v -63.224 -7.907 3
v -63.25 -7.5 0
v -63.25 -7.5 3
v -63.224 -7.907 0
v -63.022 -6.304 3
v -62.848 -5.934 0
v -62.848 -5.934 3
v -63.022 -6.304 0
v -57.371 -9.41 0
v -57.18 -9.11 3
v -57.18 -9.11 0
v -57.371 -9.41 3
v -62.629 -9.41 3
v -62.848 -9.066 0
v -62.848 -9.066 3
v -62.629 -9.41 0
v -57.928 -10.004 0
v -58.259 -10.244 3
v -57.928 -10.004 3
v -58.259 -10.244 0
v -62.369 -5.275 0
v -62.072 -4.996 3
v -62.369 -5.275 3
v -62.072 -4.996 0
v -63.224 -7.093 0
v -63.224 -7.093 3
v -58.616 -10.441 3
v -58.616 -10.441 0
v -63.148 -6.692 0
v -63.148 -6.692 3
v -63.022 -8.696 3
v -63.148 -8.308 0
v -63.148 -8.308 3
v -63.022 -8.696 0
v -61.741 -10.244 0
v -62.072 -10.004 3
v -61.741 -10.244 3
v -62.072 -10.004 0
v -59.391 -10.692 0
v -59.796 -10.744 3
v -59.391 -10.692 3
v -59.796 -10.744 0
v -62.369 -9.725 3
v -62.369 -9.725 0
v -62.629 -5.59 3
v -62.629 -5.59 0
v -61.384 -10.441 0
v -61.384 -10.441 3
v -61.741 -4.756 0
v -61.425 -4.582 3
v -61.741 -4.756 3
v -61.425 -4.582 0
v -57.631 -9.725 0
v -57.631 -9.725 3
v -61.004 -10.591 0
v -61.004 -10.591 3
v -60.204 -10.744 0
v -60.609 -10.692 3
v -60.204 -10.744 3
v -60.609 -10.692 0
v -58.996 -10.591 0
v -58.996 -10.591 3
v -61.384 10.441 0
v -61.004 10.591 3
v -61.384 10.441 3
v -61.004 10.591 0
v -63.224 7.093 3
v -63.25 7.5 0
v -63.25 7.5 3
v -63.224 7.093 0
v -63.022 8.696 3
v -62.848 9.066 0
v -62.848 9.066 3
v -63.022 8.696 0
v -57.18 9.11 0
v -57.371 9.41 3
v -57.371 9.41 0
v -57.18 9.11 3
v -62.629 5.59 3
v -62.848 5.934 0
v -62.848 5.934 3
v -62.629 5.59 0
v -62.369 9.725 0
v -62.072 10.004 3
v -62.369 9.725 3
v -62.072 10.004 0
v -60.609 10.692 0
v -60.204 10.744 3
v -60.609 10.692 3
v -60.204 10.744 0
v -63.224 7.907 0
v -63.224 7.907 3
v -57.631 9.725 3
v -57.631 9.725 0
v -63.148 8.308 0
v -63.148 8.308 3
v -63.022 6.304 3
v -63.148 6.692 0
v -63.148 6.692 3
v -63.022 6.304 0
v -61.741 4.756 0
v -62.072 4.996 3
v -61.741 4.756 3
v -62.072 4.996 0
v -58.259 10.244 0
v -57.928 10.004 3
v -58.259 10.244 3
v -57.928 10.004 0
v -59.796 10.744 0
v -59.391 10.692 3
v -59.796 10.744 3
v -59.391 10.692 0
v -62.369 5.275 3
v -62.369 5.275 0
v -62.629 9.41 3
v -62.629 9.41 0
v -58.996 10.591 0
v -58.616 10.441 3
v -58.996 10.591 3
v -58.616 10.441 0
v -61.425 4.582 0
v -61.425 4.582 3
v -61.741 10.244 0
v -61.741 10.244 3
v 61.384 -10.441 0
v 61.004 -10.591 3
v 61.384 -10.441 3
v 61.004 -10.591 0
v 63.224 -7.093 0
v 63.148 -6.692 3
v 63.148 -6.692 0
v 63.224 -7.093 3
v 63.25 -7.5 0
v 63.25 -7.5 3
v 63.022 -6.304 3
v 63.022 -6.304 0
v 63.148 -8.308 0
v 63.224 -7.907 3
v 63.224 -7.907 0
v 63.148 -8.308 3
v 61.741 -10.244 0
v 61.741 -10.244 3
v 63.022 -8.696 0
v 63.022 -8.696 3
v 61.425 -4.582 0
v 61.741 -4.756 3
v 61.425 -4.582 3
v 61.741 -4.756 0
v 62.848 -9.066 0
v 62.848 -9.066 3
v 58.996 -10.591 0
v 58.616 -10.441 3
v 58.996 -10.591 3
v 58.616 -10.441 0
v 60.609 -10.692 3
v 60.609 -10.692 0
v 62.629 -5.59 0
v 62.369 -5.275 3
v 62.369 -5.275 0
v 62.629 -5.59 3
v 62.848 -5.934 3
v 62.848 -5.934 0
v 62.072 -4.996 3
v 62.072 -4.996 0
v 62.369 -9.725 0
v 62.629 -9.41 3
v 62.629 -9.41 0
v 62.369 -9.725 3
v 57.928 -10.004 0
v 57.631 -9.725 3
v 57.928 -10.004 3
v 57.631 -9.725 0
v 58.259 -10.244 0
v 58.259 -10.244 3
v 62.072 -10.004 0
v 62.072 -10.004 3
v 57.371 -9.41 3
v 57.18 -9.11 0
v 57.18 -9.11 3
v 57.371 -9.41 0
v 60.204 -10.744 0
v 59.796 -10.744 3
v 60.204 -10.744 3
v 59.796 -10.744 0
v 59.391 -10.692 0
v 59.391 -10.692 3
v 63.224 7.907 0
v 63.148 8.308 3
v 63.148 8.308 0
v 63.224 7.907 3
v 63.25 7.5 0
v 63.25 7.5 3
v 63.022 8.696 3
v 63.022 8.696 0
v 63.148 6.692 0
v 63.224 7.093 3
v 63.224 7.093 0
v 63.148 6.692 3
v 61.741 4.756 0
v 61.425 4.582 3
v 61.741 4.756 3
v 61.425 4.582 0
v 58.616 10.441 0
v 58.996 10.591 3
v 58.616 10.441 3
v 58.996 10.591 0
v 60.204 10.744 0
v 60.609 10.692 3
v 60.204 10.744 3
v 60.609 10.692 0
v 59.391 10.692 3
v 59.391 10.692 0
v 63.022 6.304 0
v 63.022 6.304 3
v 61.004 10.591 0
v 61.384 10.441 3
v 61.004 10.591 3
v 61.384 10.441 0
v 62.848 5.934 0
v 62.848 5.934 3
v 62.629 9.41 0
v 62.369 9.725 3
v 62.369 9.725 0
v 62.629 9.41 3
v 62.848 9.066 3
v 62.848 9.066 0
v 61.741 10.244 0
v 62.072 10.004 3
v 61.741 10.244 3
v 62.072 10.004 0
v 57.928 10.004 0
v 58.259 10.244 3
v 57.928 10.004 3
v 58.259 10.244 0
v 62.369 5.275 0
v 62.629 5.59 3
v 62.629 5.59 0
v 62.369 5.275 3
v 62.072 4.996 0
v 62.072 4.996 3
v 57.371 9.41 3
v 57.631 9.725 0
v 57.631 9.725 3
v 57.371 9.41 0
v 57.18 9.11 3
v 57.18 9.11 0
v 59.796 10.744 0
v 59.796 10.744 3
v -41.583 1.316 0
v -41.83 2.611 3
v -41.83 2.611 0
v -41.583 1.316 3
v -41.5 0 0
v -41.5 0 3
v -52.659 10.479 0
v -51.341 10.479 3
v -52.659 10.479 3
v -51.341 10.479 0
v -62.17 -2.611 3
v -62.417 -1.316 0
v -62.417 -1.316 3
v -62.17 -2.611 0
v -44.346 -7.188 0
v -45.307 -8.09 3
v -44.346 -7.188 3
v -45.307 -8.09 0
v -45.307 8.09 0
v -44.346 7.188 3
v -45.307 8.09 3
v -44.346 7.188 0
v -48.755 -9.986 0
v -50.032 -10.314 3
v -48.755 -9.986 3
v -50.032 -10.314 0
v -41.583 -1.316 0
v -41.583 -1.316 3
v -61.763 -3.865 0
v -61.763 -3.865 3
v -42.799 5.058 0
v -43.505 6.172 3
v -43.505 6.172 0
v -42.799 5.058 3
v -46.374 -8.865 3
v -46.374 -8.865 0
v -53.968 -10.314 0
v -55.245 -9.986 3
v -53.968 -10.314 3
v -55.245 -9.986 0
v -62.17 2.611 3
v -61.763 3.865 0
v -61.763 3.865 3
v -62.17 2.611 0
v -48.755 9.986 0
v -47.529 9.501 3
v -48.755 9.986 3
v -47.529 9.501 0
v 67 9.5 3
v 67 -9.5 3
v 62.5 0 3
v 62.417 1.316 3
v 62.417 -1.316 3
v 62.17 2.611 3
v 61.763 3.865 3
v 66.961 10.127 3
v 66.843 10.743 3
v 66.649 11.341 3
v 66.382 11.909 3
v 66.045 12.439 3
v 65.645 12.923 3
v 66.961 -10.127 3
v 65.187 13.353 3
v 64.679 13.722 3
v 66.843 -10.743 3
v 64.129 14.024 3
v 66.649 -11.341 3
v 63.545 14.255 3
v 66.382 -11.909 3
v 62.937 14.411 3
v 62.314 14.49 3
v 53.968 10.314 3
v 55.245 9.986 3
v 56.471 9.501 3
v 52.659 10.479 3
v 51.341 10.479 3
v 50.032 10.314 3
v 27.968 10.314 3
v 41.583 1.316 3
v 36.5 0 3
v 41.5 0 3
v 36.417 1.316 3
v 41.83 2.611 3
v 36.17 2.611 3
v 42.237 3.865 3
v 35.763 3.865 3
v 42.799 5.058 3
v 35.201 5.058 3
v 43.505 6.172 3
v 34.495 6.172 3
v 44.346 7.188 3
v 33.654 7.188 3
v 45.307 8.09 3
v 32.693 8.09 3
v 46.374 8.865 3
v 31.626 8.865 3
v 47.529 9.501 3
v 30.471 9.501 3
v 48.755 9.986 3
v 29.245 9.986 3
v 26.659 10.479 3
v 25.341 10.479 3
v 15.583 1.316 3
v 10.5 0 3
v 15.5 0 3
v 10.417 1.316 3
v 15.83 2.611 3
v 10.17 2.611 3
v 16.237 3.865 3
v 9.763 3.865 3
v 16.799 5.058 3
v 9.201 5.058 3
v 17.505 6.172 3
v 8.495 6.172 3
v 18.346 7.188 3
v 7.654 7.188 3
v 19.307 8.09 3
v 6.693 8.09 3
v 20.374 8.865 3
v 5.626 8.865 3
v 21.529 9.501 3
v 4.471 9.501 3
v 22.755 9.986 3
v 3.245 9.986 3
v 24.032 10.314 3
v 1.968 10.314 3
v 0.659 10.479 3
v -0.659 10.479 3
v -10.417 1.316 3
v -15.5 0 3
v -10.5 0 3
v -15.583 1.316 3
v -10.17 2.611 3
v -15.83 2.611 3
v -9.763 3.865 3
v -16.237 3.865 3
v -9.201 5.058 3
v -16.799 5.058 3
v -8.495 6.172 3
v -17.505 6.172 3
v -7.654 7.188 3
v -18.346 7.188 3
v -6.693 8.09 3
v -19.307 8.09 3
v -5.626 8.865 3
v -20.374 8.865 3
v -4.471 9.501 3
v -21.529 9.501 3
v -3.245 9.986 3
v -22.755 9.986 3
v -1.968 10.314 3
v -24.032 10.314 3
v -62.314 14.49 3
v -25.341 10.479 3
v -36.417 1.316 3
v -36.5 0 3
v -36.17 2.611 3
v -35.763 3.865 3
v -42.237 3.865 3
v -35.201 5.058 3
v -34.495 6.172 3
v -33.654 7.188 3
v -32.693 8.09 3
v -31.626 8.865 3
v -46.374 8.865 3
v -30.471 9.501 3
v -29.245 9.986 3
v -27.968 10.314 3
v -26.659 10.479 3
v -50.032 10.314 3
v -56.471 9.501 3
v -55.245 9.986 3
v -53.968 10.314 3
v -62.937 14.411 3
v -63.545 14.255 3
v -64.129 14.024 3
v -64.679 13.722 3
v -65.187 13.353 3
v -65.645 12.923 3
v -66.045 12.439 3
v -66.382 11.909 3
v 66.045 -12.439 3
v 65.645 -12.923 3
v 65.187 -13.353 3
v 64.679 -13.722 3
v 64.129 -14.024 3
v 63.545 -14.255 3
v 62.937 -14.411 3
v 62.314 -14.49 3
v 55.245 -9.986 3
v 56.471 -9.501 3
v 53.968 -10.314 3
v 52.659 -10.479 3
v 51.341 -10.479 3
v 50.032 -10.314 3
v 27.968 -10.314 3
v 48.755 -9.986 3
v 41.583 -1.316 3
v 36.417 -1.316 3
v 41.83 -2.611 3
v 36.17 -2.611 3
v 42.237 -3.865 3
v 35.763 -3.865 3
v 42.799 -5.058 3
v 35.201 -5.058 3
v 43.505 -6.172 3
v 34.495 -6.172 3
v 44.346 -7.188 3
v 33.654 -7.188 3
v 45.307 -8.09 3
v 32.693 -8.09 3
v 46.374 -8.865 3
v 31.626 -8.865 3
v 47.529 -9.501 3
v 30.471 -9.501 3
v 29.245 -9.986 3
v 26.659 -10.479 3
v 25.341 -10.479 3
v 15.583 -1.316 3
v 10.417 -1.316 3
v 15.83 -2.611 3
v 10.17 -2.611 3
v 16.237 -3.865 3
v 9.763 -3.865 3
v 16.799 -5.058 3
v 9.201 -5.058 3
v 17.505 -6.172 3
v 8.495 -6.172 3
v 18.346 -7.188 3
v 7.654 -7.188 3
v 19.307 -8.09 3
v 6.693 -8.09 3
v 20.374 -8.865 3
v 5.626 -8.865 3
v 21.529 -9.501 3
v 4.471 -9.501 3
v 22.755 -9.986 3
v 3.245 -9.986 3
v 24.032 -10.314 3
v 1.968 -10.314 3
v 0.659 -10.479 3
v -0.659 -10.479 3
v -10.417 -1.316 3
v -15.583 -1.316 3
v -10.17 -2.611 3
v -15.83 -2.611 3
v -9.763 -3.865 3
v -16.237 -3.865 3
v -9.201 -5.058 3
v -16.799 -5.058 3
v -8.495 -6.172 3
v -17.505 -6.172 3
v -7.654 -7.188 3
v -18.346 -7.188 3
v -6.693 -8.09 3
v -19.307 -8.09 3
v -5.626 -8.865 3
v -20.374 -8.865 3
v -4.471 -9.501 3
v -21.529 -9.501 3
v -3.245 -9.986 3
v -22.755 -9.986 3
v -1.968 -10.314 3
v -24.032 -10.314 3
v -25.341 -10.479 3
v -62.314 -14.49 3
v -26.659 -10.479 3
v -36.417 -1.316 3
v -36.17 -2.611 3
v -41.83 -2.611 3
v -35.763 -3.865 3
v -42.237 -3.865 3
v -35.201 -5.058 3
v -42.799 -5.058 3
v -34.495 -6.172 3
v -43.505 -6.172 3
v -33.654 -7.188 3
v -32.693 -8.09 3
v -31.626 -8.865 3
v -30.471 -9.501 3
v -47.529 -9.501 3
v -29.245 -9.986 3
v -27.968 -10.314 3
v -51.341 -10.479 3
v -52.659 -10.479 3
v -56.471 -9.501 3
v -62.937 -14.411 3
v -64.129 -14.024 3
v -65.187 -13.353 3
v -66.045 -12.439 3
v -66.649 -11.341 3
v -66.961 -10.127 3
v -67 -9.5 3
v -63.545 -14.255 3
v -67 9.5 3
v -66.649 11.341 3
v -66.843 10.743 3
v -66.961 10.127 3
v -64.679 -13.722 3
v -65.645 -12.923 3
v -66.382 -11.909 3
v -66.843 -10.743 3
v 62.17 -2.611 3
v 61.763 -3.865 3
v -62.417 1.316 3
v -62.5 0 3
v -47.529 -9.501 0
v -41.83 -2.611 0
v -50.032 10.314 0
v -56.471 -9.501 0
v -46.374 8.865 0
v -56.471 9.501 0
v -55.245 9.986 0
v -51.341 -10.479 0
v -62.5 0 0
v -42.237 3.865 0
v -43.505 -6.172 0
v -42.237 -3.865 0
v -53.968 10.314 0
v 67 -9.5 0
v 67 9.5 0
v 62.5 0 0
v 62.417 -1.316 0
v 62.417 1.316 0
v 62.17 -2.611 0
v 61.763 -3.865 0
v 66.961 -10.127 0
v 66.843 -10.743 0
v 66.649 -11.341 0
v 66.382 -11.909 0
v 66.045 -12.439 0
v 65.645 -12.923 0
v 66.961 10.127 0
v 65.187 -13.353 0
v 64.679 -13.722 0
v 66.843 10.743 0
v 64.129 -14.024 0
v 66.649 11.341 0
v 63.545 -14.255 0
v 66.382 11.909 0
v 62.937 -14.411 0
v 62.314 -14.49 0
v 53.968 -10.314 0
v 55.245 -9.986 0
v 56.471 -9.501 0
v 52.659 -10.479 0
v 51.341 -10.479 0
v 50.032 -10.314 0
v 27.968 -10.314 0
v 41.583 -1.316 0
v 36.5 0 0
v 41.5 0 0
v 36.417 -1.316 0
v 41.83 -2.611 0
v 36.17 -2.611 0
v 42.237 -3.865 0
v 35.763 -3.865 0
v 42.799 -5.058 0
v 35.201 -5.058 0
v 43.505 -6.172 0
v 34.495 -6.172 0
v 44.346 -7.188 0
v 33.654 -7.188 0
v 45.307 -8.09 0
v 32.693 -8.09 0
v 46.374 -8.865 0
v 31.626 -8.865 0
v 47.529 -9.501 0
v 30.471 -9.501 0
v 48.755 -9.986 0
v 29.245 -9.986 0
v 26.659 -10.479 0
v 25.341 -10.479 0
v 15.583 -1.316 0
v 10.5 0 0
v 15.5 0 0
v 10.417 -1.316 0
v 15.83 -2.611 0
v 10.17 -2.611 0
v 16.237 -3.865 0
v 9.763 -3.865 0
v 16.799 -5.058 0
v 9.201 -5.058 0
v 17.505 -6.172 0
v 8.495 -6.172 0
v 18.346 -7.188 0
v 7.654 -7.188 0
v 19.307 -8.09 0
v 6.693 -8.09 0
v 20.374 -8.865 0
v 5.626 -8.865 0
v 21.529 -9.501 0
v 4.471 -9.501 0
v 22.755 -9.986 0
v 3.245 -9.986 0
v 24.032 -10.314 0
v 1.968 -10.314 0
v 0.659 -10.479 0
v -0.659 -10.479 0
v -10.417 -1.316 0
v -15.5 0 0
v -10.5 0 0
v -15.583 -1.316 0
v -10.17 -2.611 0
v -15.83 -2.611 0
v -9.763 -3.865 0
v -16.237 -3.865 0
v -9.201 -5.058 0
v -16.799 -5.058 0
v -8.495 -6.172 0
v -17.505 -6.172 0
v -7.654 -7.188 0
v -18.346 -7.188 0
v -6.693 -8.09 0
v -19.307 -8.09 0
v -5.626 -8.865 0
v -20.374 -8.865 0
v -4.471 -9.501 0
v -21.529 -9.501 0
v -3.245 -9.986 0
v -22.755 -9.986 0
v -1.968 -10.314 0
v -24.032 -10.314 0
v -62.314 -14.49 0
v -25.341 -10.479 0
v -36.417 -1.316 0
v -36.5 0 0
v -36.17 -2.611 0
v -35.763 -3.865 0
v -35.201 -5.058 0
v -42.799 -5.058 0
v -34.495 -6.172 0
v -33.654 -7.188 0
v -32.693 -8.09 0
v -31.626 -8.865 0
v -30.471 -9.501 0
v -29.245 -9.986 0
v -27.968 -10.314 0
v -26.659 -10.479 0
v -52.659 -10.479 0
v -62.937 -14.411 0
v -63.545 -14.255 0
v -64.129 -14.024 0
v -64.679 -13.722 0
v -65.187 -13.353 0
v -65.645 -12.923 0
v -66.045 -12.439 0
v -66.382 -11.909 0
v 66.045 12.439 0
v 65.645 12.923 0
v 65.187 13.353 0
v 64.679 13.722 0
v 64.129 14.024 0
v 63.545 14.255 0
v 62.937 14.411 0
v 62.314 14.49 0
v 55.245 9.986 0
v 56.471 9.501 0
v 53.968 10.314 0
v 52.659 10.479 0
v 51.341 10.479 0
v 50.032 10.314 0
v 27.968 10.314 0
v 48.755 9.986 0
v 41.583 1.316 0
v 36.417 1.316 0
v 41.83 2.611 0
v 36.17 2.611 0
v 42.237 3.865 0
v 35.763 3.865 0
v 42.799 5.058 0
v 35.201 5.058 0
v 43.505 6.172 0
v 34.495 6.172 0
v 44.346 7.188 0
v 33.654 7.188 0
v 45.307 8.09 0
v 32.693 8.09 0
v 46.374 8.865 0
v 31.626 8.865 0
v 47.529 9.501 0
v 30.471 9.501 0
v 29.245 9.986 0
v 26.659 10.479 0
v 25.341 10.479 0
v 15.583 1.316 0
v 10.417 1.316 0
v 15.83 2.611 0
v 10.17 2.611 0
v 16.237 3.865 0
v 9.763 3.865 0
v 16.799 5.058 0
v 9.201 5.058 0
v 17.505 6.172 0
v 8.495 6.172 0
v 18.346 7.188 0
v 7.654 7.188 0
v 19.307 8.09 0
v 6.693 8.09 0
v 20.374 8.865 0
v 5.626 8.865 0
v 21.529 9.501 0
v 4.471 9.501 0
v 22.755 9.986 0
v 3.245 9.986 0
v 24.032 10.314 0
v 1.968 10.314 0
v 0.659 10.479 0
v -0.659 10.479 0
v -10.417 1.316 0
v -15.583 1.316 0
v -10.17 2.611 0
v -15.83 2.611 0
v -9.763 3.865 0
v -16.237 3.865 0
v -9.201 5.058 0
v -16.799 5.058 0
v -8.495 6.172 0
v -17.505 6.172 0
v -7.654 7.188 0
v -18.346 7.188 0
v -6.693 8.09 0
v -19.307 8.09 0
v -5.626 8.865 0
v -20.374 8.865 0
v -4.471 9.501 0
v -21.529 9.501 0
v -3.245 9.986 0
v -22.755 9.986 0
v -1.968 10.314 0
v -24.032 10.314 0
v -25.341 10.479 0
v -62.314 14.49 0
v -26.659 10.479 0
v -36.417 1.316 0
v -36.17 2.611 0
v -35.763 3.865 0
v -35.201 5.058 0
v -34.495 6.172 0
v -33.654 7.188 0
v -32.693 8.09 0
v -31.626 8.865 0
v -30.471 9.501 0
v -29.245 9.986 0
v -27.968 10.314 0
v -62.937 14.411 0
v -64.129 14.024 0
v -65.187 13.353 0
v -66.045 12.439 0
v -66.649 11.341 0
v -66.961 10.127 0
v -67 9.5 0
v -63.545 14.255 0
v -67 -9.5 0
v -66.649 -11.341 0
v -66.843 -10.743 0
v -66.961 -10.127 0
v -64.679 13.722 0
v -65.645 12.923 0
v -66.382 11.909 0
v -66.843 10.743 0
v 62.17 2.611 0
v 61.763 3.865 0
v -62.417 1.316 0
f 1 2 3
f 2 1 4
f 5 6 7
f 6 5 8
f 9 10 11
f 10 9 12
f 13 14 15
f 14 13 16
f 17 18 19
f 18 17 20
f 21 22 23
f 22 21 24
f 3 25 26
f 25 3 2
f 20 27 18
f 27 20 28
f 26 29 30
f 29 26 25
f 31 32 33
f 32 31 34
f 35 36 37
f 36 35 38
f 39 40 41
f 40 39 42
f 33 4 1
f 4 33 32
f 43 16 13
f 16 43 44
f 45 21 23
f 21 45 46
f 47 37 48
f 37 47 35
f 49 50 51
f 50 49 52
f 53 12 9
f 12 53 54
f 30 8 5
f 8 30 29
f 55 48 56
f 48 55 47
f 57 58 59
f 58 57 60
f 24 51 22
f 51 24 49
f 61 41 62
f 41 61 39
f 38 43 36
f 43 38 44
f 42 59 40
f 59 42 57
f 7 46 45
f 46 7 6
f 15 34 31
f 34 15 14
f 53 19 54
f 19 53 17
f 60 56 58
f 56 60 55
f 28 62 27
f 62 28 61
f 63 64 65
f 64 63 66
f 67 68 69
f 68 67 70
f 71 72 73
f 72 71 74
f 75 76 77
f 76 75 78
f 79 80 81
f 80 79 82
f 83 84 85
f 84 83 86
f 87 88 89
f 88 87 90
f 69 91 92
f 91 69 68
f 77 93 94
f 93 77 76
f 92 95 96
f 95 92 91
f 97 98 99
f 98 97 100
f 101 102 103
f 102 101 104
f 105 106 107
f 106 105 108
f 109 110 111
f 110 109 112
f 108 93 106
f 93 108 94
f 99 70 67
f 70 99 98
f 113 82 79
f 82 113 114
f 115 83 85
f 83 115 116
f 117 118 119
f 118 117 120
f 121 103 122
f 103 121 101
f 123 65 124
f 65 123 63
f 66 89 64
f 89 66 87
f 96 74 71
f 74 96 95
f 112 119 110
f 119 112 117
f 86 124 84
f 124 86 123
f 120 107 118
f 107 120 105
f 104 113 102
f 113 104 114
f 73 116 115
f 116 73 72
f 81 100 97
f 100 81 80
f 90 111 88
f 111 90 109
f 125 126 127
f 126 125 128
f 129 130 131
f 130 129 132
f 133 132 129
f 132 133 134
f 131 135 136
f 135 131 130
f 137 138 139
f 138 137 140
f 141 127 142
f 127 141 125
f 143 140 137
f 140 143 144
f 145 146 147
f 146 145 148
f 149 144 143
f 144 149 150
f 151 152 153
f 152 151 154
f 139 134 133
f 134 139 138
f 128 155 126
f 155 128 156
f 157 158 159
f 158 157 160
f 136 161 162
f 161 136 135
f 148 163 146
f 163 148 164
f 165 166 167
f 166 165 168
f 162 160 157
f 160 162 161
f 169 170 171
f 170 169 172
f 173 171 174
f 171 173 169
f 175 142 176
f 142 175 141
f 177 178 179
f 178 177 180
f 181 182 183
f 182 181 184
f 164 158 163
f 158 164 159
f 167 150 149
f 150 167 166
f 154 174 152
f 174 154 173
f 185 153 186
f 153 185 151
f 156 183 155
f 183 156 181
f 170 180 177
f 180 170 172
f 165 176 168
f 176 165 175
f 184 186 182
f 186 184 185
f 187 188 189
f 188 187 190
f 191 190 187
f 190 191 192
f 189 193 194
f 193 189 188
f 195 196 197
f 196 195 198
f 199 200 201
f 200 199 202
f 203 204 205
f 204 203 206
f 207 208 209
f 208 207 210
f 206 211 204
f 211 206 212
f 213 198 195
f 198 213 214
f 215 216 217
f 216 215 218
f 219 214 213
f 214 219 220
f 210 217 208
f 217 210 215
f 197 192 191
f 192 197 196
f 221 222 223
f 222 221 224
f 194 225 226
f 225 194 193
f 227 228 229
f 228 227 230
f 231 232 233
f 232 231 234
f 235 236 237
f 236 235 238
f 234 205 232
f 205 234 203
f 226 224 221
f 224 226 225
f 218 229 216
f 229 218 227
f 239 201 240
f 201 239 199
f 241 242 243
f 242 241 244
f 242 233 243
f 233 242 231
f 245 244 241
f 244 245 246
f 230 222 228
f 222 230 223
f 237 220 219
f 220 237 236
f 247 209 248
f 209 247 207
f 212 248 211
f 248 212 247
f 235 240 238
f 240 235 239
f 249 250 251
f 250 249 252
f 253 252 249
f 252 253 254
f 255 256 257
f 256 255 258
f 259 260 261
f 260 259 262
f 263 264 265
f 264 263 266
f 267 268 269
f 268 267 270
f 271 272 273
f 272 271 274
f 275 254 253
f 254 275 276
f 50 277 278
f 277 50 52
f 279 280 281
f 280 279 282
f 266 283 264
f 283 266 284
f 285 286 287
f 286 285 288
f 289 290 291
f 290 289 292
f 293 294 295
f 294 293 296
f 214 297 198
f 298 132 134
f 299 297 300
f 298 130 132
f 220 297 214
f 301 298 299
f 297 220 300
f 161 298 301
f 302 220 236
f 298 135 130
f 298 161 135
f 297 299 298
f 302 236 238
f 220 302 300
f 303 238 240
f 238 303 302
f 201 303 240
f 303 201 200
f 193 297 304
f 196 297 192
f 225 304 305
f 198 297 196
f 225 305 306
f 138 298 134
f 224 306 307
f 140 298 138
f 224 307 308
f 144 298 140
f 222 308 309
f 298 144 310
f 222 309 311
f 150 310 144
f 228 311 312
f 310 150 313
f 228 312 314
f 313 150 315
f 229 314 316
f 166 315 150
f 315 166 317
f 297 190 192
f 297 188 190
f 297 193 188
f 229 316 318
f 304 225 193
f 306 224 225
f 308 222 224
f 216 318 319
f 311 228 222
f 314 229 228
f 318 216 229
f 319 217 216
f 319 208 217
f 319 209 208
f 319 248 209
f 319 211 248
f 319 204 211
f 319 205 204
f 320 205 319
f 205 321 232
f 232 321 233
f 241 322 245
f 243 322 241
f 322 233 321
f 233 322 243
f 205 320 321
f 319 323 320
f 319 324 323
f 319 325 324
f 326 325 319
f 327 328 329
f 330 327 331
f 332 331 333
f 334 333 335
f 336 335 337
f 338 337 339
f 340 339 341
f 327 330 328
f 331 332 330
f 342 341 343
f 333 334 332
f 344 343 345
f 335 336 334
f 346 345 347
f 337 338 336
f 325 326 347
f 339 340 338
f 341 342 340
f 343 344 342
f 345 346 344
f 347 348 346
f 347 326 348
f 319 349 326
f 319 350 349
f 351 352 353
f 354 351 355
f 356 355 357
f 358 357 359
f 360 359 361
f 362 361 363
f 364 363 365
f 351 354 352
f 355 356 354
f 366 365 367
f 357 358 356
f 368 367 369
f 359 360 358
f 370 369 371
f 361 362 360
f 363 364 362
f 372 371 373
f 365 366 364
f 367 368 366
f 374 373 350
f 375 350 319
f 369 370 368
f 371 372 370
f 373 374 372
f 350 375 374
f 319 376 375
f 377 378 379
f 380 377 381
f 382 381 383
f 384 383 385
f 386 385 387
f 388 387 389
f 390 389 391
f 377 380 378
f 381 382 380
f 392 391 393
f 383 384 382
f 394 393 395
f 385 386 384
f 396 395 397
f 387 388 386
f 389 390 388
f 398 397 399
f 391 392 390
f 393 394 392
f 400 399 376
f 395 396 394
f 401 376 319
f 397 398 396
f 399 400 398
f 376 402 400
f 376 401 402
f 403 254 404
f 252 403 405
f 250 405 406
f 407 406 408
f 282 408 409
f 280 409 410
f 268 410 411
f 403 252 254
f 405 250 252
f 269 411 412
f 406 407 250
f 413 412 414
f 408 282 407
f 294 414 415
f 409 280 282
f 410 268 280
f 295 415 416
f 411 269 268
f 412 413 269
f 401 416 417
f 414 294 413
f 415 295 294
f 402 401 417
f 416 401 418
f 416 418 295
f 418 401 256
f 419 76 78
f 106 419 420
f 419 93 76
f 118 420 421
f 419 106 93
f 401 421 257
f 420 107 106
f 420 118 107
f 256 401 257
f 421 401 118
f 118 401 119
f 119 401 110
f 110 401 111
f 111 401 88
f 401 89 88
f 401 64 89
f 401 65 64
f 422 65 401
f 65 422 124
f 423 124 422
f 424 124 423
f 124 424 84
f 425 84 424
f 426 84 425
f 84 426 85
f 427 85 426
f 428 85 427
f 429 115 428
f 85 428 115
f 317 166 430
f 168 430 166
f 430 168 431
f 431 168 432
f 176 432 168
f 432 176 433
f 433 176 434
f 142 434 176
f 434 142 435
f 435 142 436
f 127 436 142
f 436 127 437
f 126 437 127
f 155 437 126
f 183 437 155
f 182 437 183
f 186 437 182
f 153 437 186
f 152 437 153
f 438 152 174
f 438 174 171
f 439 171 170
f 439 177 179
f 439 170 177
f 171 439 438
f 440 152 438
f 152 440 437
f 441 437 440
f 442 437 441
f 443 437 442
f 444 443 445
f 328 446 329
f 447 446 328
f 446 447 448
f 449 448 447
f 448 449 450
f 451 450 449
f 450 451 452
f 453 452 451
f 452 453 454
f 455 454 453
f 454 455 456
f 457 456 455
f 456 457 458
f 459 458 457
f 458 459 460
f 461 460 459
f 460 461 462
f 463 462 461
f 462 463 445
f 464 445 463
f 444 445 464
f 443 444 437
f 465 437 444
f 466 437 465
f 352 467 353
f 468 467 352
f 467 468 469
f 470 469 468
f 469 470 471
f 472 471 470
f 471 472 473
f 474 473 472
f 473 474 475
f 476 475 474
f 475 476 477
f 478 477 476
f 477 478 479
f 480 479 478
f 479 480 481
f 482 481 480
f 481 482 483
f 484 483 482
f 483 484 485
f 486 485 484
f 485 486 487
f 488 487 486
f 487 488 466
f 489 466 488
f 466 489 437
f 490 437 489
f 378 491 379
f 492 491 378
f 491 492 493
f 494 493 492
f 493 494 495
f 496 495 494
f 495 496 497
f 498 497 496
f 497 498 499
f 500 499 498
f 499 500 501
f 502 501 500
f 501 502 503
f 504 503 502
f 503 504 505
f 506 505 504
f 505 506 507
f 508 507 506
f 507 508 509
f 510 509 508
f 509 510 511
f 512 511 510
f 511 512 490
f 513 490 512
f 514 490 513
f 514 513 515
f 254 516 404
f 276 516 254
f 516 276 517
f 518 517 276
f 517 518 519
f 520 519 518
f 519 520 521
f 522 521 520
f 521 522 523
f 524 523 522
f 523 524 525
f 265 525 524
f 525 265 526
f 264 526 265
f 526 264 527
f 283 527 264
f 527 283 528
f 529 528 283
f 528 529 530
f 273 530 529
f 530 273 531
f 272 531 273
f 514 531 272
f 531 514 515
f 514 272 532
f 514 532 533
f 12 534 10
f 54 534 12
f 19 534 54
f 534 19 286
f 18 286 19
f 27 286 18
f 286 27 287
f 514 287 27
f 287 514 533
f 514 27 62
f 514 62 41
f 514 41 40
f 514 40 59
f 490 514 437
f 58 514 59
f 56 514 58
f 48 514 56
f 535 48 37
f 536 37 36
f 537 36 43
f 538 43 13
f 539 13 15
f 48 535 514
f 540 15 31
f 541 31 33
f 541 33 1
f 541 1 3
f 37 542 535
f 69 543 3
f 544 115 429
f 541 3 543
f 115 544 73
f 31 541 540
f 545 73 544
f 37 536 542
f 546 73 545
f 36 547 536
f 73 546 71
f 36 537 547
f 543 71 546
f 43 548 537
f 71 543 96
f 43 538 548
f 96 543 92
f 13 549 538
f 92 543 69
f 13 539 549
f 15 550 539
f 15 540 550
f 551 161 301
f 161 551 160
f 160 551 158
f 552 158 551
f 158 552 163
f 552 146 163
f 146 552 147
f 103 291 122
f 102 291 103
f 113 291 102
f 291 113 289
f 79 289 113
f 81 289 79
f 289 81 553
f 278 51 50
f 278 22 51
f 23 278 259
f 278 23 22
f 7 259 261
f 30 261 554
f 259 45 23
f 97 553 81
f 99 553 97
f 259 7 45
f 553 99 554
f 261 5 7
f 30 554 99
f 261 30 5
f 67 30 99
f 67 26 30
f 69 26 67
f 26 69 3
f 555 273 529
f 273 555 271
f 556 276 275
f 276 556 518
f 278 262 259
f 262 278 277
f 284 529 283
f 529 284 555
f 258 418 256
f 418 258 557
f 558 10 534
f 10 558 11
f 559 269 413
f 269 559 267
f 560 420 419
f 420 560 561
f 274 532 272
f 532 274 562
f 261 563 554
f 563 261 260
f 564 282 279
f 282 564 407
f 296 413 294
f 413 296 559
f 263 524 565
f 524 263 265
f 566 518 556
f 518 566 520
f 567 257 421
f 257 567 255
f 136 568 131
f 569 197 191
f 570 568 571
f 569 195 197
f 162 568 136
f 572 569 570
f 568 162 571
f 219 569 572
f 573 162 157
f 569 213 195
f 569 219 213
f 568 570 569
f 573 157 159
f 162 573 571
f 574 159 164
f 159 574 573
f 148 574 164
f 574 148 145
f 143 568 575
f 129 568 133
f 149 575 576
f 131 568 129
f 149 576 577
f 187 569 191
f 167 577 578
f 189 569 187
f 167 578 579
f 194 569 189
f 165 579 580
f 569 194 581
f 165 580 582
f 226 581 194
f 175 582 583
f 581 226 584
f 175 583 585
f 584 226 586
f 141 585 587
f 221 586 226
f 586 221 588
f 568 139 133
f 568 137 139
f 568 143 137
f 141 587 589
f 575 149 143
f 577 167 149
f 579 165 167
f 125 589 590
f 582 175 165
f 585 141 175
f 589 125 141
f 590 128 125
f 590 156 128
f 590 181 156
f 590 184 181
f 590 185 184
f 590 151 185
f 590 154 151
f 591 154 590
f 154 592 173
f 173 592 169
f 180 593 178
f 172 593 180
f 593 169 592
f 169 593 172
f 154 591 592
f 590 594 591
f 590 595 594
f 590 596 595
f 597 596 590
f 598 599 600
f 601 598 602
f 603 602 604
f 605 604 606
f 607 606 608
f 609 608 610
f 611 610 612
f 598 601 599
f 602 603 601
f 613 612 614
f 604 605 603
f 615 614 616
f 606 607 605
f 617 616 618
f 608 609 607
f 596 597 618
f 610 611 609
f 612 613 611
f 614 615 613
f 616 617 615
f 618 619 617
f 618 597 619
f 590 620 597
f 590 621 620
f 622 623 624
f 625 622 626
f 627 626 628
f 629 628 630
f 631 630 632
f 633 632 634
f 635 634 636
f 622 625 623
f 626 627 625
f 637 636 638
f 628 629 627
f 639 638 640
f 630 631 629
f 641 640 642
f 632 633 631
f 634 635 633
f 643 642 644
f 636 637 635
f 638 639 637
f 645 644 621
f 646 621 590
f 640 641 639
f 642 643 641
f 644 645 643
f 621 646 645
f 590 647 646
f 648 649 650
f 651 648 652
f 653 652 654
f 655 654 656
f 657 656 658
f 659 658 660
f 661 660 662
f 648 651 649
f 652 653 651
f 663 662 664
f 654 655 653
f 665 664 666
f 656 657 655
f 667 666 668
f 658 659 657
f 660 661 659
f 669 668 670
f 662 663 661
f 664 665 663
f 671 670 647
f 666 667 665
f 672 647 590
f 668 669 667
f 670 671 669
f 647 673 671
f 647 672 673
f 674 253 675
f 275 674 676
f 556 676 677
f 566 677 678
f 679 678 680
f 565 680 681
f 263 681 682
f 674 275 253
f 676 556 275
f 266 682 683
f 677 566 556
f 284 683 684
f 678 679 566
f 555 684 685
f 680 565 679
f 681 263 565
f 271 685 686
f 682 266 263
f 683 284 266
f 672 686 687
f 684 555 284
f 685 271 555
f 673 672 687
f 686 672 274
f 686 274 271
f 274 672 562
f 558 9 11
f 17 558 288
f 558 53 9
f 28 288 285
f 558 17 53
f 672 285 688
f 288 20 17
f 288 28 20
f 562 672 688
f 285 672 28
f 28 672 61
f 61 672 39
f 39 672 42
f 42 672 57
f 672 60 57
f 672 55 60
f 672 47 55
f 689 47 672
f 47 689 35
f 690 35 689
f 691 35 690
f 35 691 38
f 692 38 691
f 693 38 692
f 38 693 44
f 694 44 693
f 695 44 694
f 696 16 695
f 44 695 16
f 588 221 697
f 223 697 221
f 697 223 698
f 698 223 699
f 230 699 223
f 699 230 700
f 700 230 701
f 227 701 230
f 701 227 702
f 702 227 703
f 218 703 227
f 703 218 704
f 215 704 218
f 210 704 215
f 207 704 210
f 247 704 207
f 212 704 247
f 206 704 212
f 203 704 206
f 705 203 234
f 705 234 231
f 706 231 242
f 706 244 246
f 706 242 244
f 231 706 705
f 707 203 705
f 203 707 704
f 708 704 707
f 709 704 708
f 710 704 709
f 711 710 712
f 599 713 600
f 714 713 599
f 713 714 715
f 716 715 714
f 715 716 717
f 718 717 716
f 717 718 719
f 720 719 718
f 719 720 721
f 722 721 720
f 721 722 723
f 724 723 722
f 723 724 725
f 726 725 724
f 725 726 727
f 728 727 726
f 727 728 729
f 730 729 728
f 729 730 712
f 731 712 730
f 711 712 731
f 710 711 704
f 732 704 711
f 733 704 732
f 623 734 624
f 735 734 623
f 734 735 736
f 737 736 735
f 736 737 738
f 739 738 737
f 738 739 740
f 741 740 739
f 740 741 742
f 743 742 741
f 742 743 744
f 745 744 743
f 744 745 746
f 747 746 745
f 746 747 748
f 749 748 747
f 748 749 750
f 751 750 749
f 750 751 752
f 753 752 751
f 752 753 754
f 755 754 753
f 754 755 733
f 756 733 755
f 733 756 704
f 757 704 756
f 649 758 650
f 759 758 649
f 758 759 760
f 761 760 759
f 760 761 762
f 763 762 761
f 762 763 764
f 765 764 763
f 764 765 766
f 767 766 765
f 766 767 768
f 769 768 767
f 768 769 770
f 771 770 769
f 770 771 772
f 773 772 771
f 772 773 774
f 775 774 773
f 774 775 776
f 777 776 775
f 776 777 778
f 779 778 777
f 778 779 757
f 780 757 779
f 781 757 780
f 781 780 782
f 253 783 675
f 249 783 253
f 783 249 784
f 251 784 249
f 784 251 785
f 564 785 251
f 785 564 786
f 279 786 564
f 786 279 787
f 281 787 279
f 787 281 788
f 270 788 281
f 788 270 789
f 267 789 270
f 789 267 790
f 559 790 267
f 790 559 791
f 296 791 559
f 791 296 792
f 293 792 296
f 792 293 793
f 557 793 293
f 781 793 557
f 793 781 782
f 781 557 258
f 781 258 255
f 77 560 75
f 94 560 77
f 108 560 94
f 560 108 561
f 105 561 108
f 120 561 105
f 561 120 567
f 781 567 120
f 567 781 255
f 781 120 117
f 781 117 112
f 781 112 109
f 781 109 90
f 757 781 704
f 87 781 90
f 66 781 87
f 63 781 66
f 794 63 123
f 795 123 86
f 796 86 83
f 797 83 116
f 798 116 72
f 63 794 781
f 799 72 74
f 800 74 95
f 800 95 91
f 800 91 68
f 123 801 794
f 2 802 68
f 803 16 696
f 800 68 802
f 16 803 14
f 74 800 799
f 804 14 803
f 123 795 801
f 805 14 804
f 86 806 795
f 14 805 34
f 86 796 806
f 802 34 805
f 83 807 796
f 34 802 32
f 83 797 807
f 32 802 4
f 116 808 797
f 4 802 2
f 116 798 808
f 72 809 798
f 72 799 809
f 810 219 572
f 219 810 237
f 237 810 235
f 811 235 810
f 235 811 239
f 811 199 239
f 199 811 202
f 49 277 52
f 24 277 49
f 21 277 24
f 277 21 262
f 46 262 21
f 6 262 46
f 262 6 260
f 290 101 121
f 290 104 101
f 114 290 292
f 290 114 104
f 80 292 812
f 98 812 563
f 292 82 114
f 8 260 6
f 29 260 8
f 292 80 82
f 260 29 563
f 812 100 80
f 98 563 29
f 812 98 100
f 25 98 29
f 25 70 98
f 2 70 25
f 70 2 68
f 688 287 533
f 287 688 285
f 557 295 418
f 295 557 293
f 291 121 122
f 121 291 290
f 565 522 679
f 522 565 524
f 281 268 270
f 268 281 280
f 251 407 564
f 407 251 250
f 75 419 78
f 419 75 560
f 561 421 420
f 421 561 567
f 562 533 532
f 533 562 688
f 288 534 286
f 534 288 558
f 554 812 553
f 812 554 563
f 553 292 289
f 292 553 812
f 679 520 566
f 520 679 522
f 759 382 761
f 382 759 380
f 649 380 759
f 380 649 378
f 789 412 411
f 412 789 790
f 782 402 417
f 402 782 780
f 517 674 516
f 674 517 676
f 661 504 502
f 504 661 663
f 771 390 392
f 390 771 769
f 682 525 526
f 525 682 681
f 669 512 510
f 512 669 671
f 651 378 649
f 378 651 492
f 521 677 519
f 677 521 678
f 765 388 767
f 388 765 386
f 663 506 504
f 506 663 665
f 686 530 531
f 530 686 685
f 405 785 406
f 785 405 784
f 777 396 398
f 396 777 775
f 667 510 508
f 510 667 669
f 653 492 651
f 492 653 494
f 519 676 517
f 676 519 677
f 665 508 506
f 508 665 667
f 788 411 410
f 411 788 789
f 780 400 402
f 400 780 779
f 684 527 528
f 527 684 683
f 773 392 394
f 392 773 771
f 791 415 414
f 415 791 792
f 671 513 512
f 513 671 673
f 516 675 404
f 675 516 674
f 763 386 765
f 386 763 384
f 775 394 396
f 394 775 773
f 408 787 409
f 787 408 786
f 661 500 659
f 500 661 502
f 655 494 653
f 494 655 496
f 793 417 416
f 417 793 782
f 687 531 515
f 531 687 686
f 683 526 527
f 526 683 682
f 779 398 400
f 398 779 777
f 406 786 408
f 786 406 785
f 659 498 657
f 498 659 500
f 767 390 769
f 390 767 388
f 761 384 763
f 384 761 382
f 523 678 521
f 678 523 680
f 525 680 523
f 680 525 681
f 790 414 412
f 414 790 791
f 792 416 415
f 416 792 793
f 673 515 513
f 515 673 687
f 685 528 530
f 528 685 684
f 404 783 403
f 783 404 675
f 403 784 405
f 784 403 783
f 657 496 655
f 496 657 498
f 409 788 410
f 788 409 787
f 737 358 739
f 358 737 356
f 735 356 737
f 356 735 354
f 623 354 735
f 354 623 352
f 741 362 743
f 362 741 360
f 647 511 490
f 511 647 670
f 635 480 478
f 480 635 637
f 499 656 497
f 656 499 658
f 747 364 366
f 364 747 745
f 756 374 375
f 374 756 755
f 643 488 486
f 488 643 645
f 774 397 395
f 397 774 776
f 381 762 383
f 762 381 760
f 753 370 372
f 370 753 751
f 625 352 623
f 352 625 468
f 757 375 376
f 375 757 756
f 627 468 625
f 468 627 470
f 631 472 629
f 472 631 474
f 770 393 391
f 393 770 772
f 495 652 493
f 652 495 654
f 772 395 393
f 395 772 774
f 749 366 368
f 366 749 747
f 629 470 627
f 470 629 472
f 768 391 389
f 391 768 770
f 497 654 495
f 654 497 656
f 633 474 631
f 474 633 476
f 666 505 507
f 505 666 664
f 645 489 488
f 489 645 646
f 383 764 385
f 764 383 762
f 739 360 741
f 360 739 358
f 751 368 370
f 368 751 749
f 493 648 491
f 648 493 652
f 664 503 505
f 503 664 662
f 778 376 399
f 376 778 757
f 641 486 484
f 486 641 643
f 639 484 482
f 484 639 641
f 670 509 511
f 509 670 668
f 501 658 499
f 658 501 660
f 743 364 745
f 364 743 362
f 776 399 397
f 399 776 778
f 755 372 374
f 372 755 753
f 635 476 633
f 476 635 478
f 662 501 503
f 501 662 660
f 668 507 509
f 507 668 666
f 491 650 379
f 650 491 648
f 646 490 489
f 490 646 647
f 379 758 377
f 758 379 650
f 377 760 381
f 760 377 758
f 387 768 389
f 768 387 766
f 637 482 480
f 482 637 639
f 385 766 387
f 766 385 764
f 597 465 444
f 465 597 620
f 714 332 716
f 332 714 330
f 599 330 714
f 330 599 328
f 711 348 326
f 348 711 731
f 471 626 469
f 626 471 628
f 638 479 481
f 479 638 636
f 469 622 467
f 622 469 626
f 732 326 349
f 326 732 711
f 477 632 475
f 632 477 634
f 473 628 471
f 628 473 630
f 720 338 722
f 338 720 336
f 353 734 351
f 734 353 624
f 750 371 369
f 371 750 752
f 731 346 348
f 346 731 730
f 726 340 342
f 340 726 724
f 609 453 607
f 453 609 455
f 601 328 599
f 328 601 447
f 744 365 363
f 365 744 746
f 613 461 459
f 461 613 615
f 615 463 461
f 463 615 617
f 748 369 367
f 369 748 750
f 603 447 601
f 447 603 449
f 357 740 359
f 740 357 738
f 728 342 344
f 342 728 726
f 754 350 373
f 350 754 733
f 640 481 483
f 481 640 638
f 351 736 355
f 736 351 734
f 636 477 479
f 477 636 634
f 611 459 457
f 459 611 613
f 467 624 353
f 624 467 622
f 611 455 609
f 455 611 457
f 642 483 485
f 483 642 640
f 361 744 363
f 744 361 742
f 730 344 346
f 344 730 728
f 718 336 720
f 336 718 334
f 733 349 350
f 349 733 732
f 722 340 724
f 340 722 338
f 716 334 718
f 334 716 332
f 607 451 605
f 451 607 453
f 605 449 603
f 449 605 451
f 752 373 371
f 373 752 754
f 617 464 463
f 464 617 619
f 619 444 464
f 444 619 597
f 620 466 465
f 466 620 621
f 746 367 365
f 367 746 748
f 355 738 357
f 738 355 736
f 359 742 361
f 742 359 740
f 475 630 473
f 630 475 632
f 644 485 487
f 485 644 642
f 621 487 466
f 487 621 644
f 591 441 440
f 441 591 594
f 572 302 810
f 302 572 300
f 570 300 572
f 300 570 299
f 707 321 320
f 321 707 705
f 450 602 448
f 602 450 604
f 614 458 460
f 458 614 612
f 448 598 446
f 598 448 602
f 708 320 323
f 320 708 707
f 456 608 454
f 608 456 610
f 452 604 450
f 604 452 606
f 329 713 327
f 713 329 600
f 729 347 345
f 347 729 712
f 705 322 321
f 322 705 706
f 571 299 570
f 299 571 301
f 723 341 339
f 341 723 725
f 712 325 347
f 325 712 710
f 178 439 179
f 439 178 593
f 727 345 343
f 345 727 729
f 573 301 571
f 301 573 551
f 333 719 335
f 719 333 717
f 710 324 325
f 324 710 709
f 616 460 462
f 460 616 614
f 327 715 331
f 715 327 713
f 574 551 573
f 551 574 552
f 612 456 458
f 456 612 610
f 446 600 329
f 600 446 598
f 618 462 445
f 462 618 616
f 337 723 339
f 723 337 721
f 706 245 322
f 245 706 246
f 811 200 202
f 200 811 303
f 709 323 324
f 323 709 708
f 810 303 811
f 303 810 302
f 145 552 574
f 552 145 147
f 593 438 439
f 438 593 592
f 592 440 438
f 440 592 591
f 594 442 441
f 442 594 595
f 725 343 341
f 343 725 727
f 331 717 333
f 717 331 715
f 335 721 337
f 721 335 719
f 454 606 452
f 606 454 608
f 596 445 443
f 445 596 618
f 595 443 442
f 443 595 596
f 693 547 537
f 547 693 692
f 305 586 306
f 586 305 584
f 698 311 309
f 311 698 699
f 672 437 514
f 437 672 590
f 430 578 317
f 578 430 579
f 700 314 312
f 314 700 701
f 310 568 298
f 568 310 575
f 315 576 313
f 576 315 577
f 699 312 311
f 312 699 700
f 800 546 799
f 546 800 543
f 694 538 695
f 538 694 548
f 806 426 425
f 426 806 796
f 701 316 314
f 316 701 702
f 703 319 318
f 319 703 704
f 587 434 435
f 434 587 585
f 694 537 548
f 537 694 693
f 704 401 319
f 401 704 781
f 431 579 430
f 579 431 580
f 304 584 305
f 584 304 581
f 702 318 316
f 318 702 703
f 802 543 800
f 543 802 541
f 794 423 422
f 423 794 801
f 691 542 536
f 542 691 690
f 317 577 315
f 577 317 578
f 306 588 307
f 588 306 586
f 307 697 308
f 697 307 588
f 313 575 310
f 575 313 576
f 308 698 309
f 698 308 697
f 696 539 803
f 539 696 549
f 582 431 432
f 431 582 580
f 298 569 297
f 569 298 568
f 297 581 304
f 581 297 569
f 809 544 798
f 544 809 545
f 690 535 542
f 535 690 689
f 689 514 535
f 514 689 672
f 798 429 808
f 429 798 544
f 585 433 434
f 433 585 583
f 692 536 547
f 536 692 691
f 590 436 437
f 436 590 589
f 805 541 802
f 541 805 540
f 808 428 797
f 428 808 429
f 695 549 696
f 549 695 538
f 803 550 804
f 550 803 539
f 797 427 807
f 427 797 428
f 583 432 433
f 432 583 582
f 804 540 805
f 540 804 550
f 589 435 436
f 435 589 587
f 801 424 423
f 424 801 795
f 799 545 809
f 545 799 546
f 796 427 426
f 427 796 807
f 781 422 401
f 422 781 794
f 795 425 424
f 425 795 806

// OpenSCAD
$fn = 50;

difference() {
	union() {
		hull() {
			translate(v = [-62.0, 9.5, 0]) {
				cylinder(h = 3, r = 5);
			}
			translate(v = [62.0, 9.5, 0]) {
				cylinder(h = 3, r = 5);
			}
			translate(v = [-62.0, -9.5, 0]) {
				cylinder(h = 3, r = 5);
			}
			translate(v = [62.0, -9.5, 0]) {
				cylinder(h = 3, r = 5);
			}
		}
	}
	union() {
		translate(v = [-60.0, -7.5, -100.0]) {
			cylinder(h = 200, r = 3.25);
		}
		translate(v = [-60.0, 7.5, -100.0]) {
			cylinder(h = 200, r = 3.25);
		}
		translate(v = [60.0, -7.5, -100.0]) {
			cylinder(h = 200, r = 3.25);
		}
		translate(v = [60.0, 7.5, -100.0]) {
			cylinder(h = 200, r = 3.25);
		}
		translate(v = [-60.0, -7.5, -100.0]) {
			cylinder(h = 200, r = 1.8);
		}
		translate(v = [-60.0, 7.5, -100.0]) {
			cylinder(h = 200, r = 1.8);
		}
		translate(v = [60.0, -7.5, -100.0]) {
			cylinder(h = 200, r = 1.8);
		}
		translate(v = [60.0, 7.5, -100.0]) {
			cylinder(h = 200, r = 1.8);
		}
		translate(v = [-52.0, 0, 0.0]) {
			cylinder(h = 3, r = 10.5);
		}
		translate(v = [-26.0, 0, 0.0]) {
			cylinder(h = 3, r = 10.5);
		}
		cylinder(h = 3, r = 10.5);
		translate(v = [26.0, 0, 0.0]) {
			cylinder(h = 3, r = 10.5);
		}
		translate(v = [52.0, 0, 0.0]) {
			cylinder(h = 3, r = 10.5);
		}
	}
}
